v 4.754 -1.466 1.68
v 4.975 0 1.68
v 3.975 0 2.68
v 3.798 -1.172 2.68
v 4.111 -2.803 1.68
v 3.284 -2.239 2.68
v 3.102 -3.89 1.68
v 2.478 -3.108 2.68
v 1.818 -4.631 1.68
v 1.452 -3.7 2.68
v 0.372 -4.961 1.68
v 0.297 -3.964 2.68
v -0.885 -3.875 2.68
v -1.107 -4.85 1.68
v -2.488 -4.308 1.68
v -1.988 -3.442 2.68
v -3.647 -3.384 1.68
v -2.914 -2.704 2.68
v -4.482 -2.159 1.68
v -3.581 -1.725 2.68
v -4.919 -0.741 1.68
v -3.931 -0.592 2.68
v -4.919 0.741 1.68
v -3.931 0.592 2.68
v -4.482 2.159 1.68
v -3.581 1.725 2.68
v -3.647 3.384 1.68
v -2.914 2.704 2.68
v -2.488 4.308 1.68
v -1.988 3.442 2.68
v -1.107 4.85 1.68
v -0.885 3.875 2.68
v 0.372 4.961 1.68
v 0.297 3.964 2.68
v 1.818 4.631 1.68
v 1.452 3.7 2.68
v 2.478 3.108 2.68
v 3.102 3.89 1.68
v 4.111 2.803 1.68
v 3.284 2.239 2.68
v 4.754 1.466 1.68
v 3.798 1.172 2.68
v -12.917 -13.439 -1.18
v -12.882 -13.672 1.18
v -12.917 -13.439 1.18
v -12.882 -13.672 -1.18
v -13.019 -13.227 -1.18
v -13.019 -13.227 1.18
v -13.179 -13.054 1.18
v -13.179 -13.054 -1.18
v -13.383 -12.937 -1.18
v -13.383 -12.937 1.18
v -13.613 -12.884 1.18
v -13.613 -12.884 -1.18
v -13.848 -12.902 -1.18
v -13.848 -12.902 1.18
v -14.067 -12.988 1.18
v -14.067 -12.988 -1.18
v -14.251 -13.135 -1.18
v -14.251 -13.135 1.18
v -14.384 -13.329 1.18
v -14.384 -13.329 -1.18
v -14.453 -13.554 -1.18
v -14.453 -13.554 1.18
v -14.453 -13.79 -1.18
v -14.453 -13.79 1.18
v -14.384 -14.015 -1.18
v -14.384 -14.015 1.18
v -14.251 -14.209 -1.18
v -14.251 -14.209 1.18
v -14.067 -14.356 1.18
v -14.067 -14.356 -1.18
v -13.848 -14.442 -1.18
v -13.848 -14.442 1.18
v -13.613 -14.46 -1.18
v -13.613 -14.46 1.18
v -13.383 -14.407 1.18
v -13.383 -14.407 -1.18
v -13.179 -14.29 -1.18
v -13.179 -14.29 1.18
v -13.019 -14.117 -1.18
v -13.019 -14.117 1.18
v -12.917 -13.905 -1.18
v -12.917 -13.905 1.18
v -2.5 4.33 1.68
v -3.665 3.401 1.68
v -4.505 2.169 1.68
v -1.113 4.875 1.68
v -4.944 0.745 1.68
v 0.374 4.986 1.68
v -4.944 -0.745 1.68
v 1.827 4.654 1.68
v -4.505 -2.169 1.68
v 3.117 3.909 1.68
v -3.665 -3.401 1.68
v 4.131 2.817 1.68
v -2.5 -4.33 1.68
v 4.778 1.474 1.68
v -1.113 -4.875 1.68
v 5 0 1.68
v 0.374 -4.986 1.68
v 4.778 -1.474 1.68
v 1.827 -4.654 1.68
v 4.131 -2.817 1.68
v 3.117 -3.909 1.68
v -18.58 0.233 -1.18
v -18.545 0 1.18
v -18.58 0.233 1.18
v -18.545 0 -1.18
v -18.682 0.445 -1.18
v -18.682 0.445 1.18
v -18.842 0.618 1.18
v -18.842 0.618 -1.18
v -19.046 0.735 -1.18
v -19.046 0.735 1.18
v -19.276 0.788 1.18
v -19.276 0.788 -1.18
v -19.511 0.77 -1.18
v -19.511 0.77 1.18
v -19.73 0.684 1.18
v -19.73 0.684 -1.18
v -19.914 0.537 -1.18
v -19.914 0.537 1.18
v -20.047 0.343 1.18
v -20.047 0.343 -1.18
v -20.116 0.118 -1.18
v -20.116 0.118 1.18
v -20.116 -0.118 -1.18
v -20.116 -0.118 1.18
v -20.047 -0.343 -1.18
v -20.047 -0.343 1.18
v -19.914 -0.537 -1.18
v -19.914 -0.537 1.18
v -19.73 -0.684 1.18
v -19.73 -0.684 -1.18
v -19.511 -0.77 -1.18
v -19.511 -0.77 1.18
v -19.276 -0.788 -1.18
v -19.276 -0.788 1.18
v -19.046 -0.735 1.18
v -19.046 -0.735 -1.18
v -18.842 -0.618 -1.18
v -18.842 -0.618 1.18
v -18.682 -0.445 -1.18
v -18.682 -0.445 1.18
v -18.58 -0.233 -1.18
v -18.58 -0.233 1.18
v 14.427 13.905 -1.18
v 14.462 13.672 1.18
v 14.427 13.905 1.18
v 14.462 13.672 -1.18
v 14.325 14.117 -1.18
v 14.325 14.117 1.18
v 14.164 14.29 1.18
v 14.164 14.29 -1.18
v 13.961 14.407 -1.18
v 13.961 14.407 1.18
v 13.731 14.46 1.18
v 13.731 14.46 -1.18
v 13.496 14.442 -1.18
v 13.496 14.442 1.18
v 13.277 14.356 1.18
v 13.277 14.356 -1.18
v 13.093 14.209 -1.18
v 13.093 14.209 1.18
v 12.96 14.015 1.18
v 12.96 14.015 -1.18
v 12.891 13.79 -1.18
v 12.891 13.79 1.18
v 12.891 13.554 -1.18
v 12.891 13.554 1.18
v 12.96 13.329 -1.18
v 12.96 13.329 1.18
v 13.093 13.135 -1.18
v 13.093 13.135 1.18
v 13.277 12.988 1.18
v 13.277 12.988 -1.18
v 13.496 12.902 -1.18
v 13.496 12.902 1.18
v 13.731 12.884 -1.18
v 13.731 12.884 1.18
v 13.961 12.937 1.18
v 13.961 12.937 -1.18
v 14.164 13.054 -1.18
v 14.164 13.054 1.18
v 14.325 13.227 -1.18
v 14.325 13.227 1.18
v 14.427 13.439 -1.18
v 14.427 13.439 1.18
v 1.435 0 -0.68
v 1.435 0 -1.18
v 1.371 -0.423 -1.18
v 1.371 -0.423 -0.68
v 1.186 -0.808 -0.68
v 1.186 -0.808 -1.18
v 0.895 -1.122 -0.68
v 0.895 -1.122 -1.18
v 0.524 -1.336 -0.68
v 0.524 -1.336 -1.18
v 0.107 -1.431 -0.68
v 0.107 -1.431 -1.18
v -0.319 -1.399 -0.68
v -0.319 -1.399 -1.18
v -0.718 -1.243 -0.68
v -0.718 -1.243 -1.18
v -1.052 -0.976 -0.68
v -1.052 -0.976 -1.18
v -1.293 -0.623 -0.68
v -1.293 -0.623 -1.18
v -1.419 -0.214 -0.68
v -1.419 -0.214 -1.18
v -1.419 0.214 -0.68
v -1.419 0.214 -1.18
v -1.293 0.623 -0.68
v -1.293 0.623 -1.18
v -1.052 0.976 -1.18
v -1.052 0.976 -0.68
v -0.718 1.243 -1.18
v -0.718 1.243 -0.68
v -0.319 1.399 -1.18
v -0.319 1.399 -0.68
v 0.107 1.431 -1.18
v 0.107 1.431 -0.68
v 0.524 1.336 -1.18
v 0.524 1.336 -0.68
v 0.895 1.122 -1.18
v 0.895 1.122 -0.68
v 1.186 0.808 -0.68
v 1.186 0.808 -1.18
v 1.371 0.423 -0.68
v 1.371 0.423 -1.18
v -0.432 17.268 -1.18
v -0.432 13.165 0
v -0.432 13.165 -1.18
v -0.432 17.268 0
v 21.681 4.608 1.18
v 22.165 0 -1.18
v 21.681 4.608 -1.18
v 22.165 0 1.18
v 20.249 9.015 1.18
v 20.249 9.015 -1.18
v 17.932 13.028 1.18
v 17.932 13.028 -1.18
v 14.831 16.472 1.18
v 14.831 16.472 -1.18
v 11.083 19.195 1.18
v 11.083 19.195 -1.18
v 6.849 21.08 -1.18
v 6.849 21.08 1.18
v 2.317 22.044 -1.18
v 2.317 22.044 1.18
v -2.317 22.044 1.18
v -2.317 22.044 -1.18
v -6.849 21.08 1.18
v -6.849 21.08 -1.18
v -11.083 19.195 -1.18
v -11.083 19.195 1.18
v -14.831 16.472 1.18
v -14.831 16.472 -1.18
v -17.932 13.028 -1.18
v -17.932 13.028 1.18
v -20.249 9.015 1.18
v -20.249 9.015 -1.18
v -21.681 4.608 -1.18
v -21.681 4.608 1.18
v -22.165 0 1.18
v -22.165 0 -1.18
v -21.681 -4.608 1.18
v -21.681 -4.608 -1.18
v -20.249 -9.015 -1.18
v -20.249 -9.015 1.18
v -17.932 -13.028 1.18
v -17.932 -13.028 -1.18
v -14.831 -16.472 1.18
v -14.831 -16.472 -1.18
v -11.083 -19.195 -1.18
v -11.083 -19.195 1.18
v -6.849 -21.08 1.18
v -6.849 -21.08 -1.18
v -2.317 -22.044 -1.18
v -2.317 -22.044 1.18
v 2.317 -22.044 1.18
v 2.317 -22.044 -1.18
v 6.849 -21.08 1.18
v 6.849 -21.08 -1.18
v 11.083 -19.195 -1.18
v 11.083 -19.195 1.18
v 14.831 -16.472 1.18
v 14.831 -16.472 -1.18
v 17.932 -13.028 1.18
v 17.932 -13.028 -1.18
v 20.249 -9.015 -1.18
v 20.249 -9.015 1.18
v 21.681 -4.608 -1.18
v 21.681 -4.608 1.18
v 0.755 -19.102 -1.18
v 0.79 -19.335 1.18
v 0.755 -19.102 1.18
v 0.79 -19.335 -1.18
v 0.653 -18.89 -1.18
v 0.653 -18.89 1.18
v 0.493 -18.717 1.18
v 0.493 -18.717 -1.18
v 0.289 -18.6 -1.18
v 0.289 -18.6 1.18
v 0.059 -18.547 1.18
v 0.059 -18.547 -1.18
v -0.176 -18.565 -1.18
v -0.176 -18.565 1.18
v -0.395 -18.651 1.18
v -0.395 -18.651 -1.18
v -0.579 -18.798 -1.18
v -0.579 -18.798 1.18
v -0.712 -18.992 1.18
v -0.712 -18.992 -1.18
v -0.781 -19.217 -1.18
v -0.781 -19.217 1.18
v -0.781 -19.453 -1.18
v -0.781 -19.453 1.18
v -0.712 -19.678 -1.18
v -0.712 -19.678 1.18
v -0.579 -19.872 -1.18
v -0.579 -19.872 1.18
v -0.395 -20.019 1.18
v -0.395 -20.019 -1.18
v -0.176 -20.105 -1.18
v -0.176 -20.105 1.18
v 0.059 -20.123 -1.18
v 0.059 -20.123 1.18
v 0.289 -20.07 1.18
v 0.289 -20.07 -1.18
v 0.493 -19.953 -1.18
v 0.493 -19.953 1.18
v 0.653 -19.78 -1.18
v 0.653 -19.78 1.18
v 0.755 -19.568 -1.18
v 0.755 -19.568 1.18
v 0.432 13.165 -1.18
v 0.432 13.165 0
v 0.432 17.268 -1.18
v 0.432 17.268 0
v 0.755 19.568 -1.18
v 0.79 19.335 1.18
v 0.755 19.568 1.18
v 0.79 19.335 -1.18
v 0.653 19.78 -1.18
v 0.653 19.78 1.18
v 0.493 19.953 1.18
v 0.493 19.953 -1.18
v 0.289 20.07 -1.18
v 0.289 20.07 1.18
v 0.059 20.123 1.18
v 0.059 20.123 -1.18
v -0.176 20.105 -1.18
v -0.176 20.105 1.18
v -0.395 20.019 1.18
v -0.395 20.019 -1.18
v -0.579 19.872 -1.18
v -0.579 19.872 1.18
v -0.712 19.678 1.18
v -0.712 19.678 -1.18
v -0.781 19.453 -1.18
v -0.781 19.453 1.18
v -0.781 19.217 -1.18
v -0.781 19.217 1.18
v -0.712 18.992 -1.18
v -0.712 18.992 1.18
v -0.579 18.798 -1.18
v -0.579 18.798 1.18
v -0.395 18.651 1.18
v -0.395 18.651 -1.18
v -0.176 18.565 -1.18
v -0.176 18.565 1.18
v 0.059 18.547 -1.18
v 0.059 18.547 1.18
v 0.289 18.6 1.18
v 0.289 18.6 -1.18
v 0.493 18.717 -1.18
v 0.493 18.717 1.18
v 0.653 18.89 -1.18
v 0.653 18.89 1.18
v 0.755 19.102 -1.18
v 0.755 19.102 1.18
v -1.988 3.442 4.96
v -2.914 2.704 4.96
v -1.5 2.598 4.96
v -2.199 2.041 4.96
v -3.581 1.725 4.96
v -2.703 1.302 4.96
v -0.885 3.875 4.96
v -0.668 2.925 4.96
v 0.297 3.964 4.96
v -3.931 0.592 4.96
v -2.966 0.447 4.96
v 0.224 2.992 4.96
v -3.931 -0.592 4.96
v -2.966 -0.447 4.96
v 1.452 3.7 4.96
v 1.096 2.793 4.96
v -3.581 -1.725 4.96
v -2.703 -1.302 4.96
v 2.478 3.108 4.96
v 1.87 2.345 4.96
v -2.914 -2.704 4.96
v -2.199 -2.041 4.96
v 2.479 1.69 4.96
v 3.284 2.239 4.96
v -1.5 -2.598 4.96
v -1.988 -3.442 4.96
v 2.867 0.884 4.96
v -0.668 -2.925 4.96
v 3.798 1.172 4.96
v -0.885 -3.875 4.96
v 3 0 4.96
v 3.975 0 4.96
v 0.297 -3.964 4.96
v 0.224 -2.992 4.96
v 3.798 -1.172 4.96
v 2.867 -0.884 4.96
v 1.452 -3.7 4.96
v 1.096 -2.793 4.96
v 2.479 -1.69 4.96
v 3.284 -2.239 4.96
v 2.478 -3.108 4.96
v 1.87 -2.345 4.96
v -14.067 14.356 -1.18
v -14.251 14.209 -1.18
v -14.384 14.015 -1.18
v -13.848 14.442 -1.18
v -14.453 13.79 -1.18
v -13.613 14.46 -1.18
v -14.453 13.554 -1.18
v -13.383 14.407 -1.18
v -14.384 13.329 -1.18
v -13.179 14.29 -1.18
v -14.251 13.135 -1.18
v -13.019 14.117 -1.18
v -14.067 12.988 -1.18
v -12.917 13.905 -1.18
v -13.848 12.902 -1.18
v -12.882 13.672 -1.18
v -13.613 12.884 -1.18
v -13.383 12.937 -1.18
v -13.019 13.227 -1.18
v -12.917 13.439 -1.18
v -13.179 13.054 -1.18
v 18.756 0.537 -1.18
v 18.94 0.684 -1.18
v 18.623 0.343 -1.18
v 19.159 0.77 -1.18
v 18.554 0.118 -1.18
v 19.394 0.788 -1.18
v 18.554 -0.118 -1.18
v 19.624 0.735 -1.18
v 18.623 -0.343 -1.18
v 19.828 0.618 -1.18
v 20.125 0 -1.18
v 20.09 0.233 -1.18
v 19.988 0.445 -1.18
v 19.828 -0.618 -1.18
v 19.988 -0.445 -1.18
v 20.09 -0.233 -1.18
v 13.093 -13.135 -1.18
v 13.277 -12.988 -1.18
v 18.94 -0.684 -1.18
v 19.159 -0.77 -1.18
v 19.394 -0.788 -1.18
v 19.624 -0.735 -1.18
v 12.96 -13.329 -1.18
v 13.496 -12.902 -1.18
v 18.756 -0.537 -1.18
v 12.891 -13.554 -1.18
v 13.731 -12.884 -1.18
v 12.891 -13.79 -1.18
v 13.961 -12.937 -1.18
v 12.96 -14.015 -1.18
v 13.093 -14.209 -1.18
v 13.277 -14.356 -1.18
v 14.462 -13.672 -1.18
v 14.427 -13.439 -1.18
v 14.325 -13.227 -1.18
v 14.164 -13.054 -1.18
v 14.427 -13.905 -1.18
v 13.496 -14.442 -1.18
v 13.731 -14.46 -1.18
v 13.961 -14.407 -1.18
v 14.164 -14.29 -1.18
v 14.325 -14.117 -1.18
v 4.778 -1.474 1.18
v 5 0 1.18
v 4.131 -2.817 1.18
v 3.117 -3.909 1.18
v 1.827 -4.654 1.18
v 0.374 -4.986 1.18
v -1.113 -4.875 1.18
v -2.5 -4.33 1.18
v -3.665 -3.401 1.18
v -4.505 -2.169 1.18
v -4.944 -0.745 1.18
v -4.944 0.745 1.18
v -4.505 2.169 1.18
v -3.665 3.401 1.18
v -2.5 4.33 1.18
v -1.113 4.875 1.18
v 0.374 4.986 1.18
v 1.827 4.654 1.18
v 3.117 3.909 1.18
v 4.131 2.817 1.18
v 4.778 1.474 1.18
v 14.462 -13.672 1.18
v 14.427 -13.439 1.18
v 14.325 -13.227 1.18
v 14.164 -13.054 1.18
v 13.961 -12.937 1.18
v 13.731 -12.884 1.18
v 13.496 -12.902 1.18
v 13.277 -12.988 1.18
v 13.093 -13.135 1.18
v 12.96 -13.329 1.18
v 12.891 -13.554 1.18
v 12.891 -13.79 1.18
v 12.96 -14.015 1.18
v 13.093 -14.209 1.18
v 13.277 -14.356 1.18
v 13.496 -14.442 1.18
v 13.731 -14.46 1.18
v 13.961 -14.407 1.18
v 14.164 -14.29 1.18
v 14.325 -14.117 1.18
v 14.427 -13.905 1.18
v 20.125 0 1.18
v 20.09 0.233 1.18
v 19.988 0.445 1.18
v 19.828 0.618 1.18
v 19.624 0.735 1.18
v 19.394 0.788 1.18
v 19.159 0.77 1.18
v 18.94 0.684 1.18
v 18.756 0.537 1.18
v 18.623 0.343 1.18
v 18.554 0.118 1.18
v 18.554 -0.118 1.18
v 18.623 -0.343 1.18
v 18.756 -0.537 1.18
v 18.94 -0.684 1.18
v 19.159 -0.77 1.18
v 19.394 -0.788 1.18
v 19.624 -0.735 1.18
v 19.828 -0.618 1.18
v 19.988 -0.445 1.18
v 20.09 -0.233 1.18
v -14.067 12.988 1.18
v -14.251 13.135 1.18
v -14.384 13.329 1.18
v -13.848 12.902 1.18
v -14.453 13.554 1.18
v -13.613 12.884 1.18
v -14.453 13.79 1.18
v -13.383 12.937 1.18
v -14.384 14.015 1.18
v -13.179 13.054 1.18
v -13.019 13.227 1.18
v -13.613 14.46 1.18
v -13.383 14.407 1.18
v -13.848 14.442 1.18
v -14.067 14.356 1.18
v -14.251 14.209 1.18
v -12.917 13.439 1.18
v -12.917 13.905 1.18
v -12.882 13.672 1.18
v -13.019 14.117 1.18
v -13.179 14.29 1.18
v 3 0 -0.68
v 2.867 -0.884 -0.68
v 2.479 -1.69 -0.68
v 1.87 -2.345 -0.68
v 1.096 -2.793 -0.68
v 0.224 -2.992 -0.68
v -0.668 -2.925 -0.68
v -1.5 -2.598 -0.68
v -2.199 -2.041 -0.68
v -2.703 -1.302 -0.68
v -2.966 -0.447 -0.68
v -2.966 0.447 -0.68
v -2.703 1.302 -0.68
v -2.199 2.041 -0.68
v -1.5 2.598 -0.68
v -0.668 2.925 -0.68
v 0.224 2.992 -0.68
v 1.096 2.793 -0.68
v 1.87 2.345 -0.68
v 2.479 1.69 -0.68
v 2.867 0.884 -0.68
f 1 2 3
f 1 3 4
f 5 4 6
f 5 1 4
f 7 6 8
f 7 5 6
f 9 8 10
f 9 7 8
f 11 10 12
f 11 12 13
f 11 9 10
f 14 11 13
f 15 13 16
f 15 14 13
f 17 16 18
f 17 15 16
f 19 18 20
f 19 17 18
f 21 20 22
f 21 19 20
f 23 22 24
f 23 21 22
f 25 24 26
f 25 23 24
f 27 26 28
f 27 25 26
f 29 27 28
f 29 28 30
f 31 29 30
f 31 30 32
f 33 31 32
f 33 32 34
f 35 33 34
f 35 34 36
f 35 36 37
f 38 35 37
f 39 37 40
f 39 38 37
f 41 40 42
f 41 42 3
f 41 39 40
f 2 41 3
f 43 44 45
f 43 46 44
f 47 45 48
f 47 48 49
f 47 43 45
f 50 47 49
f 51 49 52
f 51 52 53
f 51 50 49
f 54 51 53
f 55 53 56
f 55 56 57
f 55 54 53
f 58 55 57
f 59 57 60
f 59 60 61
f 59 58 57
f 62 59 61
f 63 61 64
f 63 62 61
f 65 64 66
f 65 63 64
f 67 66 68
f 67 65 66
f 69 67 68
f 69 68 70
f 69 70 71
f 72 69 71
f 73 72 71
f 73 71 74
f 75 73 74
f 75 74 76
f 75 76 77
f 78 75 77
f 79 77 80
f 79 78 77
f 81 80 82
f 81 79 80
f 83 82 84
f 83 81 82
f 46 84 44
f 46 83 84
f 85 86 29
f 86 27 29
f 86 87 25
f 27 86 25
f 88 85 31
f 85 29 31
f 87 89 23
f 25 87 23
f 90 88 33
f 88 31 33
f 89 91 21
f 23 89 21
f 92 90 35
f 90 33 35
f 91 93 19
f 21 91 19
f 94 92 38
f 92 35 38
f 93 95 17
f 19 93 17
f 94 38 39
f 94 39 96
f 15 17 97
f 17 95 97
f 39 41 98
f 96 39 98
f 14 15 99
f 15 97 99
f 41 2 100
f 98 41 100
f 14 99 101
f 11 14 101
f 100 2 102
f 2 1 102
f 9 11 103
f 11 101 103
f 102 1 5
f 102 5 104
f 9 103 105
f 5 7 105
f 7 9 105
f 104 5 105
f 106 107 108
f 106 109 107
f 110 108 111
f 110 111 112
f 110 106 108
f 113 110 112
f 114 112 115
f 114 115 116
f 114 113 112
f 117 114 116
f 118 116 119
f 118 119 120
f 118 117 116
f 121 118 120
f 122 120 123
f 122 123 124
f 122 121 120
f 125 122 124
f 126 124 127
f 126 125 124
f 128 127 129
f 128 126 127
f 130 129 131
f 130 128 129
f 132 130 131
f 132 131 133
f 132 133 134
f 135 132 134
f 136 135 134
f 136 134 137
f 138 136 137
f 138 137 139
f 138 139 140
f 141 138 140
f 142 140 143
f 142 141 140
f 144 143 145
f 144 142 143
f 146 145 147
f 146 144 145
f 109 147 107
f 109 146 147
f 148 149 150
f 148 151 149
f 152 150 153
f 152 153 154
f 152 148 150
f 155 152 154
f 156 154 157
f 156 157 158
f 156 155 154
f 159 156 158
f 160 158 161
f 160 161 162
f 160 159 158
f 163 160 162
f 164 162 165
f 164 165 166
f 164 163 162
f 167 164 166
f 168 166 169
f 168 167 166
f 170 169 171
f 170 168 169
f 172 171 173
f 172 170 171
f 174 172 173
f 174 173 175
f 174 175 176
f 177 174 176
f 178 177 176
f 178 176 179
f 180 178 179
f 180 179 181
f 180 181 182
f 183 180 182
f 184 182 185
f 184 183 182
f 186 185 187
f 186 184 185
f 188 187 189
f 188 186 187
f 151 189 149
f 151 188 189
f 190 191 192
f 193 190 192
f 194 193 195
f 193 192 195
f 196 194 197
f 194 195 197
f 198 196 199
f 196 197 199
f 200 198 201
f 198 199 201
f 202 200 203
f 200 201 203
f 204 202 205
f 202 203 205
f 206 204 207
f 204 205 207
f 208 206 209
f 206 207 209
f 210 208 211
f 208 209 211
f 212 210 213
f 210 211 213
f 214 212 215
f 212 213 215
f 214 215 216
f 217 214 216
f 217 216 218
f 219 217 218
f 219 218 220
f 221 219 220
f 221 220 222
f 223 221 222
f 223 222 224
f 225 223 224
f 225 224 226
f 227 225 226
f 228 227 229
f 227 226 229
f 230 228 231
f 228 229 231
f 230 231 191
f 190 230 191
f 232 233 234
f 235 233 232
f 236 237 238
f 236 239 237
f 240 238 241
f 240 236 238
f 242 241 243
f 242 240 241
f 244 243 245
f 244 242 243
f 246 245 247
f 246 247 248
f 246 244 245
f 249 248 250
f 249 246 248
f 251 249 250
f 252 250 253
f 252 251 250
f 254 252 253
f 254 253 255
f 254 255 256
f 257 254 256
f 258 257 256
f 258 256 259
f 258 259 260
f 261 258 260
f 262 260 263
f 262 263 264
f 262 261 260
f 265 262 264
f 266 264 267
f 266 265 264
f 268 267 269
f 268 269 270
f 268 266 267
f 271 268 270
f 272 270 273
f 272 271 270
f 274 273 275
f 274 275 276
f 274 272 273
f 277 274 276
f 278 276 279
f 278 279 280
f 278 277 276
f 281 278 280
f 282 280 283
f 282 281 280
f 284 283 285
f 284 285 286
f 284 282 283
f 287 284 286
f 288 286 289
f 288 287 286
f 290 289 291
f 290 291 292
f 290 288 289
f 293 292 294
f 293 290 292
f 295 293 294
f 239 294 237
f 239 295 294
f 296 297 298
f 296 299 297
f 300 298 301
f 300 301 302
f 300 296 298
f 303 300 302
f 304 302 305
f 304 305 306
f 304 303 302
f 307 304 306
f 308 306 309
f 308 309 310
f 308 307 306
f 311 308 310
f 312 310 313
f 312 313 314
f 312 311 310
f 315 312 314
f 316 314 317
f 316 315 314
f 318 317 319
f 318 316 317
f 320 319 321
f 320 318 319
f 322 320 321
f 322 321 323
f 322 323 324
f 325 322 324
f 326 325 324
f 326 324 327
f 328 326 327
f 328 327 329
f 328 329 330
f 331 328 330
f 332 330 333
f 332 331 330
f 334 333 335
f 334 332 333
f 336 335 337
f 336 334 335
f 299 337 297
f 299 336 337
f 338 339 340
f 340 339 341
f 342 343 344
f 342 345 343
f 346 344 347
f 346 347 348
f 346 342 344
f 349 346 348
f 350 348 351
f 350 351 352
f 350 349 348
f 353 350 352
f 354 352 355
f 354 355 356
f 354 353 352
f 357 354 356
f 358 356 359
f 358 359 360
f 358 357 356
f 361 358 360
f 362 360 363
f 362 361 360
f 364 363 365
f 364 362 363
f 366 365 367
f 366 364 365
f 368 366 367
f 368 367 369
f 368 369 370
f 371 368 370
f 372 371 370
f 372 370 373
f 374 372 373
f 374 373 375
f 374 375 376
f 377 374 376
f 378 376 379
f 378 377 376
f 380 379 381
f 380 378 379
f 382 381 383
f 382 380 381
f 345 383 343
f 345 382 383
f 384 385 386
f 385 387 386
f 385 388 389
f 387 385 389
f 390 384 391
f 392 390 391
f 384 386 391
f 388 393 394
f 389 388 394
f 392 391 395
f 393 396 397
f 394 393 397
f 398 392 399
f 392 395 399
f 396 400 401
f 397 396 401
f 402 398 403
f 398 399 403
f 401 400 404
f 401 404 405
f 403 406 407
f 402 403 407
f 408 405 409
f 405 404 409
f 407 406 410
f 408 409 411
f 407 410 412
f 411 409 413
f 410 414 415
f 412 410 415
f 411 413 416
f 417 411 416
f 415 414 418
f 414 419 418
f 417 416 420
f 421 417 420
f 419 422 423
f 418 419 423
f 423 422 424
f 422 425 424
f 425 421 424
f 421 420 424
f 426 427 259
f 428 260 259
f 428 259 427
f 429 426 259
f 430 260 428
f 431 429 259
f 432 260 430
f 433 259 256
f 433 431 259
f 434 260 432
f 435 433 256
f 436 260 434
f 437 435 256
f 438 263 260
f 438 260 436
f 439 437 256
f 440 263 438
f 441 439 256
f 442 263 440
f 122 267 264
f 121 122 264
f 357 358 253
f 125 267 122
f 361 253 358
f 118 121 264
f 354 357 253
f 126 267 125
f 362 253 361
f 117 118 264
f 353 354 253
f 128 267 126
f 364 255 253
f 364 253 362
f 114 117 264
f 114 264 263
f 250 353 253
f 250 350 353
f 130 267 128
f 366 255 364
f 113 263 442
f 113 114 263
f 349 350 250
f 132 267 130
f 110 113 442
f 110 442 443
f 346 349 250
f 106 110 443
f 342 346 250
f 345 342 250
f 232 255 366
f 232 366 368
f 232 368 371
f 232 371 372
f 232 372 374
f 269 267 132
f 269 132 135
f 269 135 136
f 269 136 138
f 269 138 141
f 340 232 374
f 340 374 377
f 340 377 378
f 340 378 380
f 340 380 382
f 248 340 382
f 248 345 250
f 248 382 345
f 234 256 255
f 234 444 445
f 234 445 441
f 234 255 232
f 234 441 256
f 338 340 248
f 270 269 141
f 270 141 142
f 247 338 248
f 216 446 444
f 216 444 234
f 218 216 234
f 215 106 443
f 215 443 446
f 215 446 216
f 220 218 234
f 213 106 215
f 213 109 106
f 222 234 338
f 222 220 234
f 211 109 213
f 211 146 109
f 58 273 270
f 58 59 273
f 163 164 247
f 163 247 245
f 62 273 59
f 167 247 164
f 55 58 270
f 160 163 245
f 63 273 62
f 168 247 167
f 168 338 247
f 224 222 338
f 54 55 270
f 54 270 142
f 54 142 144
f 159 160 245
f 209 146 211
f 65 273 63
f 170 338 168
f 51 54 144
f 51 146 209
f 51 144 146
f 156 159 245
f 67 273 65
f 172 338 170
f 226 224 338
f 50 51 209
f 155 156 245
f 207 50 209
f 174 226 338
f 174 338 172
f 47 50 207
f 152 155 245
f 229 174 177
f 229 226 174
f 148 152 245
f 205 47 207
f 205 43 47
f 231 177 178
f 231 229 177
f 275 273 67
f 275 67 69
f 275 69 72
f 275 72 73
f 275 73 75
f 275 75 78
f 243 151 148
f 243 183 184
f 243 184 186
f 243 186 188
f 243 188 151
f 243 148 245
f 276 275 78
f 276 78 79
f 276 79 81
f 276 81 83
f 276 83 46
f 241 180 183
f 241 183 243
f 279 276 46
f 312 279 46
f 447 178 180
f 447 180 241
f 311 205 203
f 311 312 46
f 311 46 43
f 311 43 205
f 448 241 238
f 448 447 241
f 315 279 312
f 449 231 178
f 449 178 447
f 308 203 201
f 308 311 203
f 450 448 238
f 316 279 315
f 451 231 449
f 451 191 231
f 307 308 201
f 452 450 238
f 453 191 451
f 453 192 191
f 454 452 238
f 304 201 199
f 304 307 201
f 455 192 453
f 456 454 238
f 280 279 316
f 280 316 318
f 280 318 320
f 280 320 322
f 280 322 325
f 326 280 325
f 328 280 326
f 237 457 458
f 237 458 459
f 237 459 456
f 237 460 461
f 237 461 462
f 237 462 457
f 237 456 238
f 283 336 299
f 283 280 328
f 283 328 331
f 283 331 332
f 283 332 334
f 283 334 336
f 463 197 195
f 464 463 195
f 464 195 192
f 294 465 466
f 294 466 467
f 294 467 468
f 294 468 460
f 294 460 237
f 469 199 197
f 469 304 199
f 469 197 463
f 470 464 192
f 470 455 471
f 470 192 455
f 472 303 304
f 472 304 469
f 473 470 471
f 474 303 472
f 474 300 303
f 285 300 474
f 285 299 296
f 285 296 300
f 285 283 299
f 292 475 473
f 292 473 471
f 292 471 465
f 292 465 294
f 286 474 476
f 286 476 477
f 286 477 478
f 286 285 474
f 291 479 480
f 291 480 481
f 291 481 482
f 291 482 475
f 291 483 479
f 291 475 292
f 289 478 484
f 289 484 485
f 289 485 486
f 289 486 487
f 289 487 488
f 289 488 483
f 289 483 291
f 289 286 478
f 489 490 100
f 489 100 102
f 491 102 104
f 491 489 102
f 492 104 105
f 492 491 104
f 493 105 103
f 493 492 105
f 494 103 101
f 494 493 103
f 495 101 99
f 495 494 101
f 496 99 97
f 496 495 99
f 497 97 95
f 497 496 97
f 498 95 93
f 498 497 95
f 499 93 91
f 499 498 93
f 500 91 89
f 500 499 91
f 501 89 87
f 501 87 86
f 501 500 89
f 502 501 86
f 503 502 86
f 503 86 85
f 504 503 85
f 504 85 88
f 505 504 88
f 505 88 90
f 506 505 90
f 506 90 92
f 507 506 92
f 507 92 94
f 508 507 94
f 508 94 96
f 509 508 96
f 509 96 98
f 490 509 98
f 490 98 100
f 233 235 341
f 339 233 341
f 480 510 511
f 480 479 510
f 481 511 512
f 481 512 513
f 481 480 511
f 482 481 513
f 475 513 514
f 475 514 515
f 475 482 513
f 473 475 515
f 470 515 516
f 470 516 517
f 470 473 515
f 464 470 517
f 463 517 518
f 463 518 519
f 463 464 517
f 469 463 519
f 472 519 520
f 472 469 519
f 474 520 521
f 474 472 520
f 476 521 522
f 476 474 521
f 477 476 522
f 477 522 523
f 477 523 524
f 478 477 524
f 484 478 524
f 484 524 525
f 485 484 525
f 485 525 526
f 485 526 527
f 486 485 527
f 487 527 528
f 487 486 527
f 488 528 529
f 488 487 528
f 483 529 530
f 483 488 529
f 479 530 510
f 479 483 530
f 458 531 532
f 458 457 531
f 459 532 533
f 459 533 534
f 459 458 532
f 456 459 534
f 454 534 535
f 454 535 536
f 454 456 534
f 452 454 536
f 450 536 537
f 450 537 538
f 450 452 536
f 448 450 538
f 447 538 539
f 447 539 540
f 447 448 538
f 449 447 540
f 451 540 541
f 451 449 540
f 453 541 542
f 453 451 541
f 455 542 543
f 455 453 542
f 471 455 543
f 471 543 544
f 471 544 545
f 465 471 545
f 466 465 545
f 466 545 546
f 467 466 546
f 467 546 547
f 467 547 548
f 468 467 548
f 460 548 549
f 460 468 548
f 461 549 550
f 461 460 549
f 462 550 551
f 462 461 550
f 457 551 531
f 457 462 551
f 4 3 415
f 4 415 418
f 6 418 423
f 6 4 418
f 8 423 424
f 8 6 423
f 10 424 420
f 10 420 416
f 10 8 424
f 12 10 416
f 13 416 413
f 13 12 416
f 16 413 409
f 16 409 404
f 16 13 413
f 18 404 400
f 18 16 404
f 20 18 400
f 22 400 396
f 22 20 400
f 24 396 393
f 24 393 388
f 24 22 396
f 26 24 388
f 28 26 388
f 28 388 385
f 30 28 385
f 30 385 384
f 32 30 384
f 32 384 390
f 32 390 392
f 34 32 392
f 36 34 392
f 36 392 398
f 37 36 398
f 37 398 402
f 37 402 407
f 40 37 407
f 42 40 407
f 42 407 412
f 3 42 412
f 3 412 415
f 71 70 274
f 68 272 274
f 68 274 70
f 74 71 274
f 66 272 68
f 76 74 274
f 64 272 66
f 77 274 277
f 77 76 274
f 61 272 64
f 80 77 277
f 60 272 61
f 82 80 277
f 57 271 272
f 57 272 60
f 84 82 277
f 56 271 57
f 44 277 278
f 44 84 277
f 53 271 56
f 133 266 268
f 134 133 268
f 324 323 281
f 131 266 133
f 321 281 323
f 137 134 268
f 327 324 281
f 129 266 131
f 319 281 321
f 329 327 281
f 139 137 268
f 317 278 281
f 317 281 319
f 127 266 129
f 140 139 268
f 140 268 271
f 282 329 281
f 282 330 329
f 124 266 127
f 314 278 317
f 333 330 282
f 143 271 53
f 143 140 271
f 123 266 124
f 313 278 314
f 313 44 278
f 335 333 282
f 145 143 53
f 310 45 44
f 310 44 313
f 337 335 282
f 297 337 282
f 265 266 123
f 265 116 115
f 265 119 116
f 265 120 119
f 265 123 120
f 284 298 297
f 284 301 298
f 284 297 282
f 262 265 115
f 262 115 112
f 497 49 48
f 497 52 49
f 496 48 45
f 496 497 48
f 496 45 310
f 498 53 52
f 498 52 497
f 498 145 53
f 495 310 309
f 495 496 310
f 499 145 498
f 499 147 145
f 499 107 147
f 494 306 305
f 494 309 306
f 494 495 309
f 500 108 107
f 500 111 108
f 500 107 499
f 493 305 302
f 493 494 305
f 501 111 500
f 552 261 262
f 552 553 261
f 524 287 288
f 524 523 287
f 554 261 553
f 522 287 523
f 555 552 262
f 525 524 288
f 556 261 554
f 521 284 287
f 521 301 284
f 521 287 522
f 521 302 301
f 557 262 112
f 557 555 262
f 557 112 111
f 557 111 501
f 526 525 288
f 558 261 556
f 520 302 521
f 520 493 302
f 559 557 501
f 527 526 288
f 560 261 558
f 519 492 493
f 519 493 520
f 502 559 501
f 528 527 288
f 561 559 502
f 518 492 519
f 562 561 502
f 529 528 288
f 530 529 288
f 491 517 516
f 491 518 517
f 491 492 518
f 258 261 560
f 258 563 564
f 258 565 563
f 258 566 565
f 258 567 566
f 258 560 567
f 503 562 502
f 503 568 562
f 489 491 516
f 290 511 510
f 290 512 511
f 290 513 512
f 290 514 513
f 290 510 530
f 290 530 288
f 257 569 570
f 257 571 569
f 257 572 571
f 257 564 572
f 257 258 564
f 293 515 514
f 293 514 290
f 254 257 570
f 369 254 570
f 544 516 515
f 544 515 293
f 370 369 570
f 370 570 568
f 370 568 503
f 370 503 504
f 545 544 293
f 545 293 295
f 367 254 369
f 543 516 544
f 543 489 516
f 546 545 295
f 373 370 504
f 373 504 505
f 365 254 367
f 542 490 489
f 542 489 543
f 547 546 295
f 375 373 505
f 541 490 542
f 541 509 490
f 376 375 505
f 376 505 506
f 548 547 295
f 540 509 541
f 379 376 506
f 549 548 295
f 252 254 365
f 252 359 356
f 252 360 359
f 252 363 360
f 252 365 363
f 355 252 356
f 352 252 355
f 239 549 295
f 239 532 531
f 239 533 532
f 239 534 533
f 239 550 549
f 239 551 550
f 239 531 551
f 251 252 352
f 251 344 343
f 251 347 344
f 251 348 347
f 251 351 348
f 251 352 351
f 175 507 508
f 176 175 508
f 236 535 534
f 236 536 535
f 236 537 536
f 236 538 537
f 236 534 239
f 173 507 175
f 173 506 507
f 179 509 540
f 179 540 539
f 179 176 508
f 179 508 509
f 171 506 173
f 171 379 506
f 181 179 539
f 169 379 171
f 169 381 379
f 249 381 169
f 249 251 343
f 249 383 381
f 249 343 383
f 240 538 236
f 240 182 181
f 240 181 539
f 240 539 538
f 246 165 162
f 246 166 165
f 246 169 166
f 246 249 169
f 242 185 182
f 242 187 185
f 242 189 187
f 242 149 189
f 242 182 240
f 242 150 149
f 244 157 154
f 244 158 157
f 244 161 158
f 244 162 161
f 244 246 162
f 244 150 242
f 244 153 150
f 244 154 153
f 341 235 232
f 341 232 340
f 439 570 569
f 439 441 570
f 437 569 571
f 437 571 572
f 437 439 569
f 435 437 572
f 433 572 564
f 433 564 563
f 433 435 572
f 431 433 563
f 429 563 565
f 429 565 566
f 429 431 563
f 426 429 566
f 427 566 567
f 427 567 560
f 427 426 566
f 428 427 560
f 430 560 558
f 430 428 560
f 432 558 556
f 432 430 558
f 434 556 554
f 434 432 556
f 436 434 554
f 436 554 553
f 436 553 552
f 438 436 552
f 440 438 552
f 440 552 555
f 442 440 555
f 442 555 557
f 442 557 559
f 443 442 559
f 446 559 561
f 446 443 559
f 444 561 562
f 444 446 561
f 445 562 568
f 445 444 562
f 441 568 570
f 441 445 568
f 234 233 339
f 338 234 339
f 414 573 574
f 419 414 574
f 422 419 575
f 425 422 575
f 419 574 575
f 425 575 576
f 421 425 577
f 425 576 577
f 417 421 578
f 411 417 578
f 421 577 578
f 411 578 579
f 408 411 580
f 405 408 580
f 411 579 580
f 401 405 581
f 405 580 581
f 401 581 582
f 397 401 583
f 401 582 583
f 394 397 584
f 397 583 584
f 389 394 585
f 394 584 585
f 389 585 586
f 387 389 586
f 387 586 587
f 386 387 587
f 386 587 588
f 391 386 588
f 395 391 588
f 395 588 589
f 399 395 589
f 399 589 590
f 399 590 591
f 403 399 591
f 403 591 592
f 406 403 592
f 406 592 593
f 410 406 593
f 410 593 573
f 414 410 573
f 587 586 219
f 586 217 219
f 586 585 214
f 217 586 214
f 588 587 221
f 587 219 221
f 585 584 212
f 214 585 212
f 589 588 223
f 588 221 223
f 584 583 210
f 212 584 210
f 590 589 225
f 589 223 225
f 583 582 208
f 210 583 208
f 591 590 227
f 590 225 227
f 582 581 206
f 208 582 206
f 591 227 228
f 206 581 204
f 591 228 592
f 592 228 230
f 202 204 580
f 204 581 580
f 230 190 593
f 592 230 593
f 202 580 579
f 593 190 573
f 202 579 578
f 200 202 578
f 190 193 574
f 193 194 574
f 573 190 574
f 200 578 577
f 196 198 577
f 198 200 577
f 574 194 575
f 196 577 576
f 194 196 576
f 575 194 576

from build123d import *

# Parameters (mm, degrees)
F0_R     = 22.165
F0_R_2   = 0.79
F0_R_3   = 5
F0_W     = 0.864478
F0_H     = 4.103523
F1_DEPTH = 1.18
F2_R     = 5
F2_R_2   = 3.975
F3_DEPTH = 2.86
F2_R_3   = 3
F4_DEPTH = 6.14
F2_R_4   = 1.435
F5_DEPTH = 0.5
F6_SIZE  = 1
F7_DEPTH = 25


with BuildPart() as f1:
    # F0 (on Top) → F1 (new body, symmetric)
    with BuildSketch(Plane.XY):
        Circle(F0_R)
        with Locations((-13.67191, -13.67191)):
            Circle(F0_R_2, mode=Mode.SUBTRACT)
        with Locations((0, -19.335)):
            Circle(F0_R_2, mode=Mode.SUBTRACT)
        with Locations((13.67191, -13.67191)):
            Circle(F0_R_2, mode=Mode.SUBTRACT)
        with Locations((-19.335, 0)):
            Circle(F0_R_2, mode=Mode.SUBTRACT)
        with Locations((-13.67191, 13.67191)):
            Circle(F0_R_2, mode=Mode.SUBTRACT)
        Circle(F0_R_3, mode=Mode.SUBTRACT)
        with Locations((19.335, 0)):
            Circle(F0_R_2, mode=Mode.SUBTRACT)
        with Locations((0, 15.216693)):
            Rectangle(F0_W, F0_H, mode=Mode.SUBTRACT)
        with Locations((0, 19.335)):
            Circle(F0_R_2, mode=Mode.SUBTRACT)
        with Locations((13.67191, 13.67191)):
            Circle(F0_R_2, mode=Mode.SUBTRACT)
        with Locations((0, 15.216693)):
            Rectangle(F0_W, F0_H)
    extrude(amount=F1_DEPTH, both=True)

    # F2 (on face) → F3 (join)
    with BuildSketch(Plane(origin=(0, 0, -1.18), x_dir=(1, 0, 0), z_dir=(0, 0, -1))):
        Circle(F2_R)
        Circle(F2_R_2, mode=Mode.SUBTRACT)
    extrude(amount=-F3_DEPTH)

    # F2 (on face) → F4 (join)
    with BuildSketch(Plane(origin=(0, 0, -1.18), x_dir=(1, 0, 0), z_dir=(0, 0, -1))):
        Circle(F2_R_2)
        Circle(F2_R_3, mode=Mode.SUBTRACT)
    extrude(amount=-F4_DEPTH)

    # F2 (on face) → F5 (join)
    with BuildSketch(Plane(origin=(0, 0, -1.18), x_dir=(1, 0, 0), z_dir=(0, 0, -1))):
        Circle(F2_R_3)
        Circle(F2_R_4, mode=Mode.SUBTRACT)
    extrude(amount=-F5_DEPTH)

    # F6
    f6_edges = [f1.edges().sort_by_distance(p)[0] for p in [
        (-3.975, 0, 1.68),
    ]]
    chamfer(f6_edges, length=F6_SIZE)

    # F0 (on Top) → F7 (cut)
    with BuildSketch(Plane.XY):
        with Locations((0, 15.216693)):
            Rectangle(F0_W, F0_H)
    extrude(amount=-F7_DEPTH, mode=Mode.SUBTRACT)


solid = f1.part
